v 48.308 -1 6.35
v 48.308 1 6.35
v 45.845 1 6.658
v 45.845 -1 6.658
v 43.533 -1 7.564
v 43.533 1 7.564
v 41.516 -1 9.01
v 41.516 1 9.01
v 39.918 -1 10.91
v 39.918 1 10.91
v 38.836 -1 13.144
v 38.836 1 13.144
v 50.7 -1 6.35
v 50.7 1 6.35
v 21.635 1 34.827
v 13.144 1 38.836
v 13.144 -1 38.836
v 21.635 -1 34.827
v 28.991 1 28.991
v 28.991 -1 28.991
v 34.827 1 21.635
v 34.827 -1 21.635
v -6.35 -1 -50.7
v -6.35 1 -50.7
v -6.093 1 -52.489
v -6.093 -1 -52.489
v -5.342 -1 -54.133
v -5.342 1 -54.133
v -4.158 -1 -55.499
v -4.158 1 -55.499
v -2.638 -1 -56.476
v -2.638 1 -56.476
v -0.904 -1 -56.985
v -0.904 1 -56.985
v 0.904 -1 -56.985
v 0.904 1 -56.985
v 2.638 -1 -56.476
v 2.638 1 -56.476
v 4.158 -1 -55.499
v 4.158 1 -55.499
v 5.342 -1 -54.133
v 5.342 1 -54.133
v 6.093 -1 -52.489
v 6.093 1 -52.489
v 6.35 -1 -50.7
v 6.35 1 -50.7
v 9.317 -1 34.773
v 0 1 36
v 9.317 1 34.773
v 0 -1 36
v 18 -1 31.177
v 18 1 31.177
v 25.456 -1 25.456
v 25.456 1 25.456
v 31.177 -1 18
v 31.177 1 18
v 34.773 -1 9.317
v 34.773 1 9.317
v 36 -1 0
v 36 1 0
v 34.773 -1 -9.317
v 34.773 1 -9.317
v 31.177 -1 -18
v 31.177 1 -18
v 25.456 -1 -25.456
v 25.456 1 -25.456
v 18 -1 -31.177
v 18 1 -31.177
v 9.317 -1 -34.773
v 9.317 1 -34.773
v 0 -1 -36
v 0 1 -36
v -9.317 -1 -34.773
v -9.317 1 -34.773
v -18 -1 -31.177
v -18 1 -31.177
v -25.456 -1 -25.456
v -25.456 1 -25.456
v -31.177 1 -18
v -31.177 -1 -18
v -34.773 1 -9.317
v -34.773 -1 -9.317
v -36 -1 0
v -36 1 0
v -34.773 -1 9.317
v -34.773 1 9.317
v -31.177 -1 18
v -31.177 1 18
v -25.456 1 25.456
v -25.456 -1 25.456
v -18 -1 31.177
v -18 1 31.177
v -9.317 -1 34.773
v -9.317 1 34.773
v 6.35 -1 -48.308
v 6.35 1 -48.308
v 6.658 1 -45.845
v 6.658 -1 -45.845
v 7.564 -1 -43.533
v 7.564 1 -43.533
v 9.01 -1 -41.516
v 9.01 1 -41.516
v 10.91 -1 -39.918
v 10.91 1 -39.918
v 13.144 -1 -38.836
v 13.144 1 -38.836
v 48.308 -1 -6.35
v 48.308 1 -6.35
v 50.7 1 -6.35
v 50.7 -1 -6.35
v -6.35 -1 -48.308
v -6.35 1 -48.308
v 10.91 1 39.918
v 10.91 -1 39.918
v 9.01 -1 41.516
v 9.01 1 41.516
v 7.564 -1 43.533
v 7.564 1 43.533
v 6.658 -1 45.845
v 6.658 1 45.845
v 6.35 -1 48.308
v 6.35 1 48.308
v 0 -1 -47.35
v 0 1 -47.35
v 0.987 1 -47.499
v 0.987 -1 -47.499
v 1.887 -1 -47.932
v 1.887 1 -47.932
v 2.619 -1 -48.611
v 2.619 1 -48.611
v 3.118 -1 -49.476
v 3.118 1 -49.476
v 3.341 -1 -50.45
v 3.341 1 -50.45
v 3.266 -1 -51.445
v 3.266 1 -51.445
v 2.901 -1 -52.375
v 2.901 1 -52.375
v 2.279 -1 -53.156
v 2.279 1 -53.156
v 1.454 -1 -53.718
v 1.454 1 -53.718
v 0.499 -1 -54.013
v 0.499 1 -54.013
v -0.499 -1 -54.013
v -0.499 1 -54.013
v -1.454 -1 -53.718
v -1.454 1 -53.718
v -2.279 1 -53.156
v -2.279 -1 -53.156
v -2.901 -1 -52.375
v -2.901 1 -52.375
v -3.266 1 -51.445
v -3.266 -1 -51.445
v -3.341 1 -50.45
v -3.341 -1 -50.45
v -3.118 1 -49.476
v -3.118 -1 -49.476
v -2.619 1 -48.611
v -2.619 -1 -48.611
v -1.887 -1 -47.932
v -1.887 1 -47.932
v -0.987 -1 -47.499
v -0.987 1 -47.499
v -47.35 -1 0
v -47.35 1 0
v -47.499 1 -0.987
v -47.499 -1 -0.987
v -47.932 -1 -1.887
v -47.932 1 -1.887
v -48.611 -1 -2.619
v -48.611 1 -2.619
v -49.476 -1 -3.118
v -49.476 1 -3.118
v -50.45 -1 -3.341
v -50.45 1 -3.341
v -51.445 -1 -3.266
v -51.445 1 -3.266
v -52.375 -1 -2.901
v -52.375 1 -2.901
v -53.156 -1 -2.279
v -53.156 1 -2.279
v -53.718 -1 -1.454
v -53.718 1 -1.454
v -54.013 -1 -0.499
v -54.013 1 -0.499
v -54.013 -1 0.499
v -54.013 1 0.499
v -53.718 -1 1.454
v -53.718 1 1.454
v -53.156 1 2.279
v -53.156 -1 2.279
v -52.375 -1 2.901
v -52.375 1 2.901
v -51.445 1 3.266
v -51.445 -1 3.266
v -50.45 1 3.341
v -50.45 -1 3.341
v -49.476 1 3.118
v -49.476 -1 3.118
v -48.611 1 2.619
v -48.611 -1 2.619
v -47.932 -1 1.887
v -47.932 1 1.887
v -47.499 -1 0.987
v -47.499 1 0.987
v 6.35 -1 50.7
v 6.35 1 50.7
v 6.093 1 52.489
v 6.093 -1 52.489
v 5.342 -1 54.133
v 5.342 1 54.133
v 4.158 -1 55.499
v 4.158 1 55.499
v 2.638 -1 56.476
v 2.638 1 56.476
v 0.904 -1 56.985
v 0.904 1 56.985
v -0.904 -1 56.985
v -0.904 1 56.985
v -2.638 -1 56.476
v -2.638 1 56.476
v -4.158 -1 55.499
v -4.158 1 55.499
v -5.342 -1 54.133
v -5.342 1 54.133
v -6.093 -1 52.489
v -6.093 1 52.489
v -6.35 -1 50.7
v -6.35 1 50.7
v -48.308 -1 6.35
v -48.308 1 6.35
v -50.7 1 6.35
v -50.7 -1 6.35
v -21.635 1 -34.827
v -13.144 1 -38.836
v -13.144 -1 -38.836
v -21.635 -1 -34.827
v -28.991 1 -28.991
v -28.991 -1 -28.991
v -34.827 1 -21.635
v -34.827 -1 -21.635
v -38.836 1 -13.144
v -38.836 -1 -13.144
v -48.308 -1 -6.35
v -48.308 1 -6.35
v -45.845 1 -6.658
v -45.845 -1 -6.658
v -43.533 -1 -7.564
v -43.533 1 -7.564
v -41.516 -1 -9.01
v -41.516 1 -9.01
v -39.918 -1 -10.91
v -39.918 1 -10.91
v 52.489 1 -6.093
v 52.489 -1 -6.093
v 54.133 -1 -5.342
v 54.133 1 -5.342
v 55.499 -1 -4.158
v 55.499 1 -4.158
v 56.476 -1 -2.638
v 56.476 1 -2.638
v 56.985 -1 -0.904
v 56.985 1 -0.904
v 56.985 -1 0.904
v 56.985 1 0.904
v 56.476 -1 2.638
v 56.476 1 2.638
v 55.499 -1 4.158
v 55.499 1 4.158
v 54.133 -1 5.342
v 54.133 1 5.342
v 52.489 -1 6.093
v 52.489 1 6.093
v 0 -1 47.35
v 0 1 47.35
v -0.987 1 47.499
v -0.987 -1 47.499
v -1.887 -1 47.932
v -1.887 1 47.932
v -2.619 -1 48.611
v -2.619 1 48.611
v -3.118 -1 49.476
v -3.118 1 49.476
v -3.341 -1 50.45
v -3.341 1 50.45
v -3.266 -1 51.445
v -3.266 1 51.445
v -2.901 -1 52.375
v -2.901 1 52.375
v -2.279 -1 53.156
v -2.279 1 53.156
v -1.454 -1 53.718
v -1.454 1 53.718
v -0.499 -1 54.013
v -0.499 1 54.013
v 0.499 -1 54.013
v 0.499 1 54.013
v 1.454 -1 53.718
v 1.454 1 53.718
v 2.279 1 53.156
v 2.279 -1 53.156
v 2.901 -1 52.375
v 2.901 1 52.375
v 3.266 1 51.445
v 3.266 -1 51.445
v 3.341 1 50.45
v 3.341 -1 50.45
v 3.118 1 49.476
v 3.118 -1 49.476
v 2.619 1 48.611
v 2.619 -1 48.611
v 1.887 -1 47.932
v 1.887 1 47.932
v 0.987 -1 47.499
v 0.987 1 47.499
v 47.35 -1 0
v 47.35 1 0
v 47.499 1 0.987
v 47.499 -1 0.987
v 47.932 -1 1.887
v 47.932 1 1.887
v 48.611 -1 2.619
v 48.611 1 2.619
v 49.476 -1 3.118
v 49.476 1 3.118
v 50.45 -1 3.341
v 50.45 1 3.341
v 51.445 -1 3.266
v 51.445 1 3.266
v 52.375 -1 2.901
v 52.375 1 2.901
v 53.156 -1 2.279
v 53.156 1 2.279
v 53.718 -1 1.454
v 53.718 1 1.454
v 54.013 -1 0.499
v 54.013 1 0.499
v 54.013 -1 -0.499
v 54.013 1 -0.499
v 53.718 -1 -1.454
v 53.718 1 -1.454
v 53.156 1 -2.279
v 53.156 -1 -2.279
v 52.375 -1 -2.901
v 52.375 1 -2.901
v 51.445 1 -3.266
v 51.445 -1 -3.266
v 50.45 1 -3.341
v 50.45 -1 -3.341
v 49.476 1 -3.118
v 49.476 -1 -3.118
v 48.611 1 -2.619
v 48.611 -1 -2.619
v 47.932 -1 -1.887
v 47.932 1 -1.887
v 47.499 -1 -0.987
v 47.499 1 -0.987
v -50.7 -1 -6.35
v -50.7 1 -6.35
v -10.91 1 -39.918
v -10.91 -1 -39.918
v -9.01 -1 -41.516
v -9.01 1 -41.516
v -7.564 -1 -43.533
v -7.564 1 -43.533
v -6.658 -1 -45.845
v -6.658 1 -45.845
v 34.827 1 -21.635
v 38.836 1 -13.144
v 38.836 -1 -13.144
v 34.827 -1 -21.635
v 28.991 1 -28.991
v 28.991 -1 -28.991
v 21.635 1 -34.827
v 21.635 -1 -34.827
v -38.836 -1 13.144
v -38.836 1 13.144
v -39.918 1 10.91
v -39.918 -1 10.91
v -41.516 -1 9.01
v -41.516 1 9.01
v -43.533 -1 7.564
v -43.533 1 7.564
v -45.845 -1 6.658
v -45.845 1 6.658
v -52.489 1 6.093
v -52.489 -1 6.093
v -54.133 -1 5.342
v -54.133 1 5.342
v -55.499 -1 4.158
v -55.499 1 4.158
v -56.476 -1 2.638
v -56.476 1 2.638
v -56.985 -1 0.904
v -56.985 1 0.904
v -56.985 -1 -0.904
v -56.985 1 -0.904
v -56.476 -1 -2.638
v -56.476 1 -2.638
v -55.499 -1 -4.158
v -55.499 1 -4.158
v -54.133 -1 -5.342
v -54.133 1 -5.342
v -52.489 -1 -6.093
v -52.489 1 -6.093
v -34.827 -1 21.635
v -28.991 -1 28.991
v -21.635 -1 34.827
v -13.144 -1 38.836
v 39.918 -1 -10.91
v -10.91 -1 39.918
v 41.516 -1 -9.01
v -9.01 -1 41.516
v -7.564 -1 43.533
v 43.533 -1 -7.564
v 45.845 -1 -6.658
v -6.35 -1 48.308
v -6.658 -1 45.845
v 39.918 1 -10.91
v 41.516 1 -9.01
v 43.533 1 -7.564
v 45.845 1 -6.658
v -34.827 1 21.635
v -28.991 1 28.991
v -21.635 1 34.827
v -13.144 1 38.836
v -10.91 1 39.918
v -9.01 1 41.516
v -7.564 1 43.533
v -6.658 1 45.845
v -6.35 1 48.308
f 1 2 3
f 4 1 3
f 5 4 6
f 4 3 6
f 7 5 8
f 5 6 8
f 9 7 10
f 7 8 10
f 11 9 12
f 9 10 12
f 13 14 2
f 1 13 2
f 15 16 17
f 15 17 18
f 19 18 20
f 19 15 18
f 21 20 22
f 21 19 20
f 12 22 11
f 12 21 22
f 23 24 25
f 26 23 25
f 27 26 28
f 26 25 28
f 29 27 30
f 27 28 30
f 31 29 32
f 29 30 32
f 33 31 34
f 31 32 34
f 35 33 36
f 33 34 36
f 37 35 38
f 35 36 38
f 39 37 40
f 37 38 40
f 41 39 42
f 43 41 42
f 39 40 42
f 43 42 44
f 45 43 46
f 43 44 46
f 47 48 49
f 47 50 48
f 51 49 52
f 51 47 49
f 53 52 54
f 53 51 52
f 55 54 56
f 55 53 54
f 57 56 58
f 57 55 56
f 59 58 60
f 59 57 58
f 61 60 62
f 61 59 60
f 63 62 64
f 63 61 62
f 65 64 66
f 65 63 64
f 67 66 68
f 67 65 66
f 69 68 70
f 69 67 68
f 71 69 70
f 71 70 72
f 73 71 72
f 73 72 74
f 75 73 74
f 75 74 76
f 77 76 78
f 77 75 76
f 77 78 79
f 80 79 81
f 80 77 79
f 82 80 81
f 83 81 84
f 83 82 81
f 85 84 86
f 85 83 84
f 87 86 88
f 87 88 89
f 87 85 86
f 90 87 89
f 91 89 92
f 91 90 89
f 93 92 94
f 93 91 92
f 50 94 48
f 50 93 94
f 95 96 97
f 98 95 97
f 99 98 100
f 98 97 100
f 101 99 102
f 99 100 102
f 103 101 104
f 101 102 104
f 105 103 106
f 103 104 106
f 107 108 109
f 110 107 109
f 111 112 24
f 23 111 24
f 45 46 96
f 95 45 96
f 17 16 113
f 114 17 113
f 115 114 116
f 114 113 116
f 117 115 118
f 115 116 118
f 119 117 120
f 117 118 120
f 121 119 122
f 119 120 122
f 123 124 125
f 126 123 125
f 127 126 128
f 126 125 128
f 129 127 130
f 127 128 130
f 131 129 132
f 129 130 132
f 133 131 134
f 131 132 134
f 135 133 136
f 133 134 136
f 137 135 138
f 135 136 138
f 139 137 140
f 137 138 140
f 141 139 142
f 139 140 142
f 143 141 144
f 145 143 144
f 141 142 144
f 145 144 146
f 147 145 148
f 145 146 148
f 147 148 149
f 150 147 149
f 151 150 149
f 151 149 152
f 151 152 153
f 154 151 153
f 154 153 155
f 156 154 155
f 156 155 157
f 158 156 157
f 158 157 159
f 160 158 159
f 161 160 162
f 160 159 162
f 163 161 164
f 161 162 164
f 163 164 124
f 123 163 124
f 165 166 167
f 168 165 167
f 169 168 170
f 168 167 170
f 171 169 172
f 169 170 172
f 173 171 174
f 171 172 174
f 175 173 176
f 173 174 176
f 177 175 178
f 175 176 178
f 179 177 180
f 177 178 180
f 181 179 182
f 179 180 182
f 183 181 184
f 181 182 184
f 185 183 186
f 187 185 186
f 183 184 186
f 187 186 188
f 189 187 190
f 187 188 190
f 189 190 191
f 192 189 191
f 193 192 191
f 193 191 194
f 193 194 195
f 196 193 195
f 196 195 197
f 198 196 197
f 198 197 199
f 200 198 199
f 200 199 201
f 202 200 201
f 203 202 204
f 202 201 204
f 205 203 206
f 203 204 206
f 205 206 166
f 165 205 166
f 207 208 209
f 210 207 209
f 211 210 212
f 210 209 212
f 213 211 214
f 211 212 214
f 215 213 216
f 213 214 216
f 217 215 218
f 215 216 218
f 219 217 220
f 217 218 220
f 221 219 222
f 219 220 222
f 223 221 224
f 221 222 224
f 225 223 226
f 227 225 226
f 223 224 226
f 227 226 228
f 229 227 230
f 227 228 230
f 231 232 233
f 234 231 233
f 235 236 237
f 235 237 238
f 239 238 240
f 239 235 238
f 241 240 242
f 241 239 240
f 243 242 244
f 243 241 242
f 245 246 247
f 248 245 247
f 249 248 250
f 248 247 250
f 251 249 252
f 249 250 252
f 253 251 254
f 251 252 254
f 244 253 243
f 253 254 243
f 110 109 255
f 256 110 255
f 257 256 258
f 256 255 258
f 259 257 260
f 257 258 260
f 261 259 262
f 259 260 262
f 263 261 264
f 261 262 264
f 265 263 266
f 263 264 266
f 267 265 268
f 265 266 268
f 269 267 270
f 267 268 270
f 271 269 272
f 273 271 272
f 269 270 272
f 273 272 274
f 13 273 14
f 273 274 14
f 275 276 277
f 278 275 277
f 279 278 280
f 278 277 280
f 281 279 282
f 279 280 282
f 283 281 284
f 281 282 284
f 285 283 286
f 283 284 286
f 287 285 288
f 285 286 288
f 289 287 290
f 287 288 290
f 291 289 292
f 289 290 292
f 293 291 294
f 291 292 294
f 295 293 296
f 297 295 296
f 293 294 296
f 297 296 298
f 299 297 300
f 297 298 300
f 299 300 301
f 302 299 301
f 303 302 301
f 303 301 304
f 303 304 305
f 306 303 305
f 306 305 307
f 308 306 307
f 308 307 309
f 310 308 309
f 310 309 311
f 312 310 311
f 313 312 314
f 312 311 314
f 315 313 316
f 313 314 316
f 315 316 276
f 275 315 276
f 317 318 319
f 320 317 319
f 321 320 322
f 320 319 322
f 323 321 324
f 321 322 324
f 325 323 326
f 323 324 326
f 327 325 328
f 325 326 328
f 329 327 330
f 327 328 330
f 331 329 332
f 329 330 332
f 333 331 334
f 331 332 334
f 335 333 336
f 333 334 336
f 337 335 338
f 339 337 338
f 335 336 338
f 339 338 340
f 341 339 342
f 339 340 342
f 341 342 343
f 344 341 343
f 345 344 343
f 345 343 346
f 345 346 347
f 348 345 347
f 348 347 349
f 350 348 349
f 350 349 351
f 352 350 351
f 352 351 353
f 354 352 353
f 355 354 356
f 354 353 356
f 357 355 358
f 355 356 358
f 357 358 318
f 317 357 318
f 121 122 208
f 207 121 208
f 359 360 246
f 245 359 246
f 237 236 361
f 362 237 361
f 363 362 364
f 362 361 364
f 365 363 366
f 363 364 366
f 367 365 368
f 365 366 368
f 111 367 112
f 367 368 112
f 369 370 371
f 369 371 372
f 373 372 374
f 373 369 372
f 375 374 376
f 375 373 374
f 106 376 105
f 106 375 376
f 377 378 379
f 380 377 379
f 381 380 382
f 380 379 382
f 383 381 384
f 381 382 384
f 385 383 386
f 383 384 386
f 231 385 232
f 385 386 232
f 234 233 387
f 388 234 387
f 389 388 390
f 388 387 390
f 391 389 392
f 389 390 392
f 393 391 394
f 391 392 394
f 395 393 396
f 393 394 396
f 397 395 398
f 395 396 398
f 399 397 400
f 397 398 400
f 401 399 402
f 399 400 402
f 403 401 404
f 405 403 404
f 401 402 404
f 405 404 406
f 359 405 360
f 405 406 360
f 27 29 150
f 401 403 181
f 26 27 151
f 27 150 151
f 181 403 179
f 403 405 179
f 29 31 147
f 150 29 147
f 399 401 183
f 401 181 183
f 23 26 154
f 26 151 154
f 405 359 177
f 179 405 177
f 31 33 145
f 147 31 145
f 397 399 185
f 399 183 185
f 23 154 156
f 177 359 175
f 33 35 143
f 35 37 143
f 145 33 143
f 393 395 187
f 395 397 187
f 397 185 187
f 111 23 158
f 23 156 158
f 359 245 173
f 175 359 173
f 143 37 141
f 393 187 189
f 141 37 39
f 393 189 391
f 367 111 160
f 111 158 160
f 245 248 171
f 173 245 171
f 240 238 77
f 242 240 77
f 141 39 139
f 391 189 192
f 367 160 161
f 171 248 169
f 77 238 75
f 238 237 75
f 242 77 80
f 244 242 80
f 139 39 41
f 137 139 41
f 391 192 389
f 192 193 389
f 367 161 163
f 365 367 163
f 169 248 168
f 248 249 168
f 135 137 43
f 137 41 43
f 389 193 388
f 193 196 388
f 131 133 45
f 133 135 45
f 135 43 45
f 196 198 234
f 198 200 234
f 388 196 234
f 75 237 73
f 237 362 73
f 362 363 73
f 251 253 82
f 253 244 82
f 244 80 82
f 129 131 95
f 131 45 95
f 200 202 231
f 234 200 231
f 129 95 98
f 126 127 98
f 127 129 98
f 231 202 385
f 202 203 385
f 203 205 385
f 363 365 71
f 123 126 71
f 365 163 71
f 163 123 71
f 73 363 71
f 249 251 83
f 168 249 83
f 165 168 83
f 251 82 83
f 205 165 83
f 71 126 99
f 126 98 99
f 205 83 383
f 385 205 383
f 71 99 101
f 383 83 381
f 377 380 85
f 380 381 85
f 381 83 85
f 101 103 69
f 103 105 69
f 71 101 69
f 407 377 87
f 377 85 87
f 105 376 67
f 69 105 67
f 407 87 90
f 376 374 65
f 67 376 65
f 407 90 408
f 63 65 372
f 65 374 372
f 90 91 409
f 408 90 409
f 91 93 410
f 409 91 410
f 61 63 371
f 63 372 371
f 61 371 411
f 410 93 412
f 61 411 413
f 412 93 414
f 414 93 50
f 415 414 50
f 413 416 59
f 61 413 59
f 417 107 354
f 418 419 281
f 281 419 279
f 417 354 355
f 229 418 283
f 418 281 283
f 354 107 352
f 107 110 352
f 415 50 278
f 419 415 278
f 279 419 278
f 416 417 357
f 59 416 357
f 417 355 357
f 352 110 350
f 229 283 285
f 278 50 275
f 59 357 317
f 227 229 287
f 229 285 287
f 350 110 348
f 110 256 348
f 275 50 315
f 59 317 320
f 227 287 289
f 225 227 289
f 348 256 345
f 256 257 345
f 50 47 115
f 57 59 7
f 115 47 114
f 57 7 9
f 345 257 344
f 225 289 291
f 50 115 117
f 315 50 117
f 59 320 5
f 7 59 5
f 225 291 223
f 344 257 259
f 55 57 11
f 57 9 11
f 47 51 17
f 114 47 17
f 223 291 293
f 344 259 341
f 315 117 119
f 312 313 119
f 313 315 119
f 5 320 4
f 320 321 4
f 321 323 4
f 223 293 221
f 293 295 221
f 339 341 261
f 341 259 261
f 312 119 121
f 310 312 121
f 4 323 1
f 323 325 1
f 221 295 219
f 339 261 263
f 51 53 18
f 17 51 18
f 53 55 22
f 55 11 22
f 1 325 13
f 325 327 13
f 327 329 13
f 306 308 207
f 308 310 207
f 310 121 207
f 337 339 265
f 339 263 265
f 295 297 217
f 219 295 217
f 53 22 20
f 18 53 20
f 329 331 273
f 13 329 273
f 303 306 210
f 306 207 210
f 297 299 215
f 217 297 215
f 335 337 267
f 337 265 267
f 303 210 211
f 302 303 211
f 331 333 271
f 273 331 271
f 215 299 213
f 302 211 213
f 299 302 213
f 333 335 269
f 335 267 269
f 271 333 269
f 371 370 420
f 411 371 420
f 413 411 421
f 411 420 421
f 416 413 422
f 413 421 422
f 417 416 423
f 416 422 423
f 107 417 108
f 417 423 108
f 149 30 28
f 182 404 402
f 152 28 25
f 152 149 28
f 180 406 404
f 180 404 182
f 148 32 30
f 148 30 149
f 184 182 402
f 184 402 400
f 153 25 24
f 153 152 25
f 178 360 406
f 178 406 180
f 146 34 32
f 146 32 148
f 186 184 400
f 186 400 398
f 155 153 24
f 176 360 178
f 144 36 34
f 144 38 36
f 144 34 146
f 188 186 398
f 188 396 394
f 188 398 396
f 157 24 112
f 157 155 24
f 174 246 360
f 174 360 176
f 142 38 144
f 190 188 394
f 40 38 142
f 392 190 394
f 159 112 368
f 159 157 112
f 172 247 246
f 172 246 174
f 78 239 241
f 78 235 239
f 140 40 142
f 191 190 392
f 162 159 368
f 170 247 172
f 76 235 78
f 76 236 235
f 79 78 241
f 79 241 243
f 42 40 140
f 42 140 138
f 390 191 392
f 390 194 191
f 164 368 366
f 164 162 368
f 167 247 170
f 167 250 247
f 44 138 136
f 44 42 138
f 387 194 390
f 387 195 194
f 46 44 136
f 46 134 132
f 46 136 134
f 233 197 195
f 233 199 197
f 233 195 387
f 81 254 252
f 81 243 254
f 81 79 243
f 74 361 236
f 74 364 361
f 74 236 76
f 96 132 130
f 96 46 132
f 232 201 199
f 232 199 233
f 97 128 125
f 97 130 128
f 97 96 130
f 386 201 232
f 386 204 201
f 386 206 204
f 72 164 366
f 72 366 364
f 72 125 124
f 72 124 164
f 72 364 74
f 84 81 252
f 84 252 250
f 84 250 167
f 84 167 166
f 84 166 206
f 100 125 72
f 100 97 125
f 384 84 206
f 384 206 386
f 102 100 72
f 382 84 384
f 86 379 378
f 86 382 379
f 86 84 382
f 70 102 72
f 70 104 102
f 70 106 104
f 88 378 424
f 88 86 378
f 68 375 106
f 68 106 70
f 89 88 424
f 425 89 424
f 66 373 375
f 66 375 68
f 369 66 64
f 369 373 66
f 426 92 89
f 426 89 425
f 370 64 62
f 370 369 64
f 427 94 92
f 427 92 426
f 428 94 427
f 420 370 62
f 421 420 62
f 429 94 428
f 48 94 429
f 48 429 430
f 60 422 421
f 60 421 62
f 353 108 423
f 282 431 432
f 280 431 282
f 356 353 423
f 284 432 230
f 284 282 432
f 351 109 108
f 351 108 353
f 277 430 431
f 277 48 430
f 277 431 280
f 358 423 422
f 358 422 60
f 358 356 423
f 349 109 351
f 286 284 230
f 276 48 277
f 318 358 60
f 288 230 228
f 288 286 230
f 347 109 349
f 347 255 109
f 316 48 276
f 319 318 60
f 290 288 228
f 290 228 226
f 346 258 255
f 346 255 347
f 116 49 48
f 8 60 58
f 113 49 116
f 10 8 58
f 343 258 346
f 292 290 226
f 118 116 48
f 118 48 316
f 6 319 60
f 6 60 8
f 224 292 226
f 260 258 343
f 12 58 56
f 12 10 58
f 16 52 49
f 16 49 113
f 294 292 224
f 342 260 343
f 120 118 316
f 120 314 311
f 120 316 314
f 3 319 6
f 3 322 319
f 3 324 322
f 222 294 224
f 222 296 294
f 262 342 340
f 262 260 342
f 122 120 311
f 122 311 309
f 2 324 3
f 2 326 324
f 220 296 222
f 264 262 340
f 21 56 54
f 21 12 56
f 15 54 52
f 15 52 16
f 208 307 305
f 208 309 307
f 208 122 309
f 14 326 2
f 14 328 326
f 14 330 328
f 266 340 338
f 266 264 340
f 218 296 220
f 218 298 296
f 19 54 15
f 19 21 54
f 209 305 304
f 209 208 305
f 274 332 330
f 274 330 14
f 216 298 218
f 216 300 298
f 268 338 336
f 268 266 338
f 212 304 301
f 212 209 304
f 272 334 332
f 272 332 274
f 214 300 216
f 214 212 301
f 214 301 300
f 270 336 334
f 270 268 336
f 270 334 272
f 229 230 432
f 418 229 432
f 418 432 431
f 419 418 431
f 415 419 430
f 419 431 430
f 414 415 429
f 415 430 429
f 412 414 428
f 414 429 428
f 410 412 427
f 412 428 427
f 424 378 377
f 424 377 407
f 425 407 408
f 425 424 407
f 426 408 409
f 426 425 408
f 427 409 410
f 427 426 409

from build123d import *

# Parameters (mm, degrees)
SKETCH1_R           = 41
SKETCH1_R_2         = 36
BOSS_EXTRUDE1_DEPTH = 1
SKETCH2_R           = 3.35
BOSS_EXTRUDE2_DEPTH = 2
CIRPATTERN1_COUNT   = 4


with BuildPart() as part:
    # Sketch1 → Boss-Extrude1 (new, symmetric)
    with BuildSketch(Plane(origin=(0, 0, 0), x_dir=(1, 0, 0), z_dir=(0, 1, 0))):
        with Locations(Location((0, 0, 0), (0, 0, 270))):
            Circle(SKETCH1_R)
        with Locations(Location((0, 0, 0), (0, 0, 270))):
            Circle(SKETCH1_R_2, mode=Mode.SUBTRACT)
    extrude(amount=BOSS_EXTRUDE1_DEPTH, both=True)

    # Sketch2 → Boss-Extrude2 (add)
    with BuildSketch(Plane(origin=(0, 1, 0), x_dir=(1, 0, 0), z_dir=(0, 1, 0))):
        with BuildLine():
            Line((-6.35, 48.308151486), (-6.35, 50.7))
            ThreePointArc((-6.35, 50.7), (0, 57.05), (6.35, 50.7))
            Line((6.35, 50.7), (6.35, 48.308151486))
            ThreePointArc((6.35, 48.308151486), (8.224151628, 42.479722175), (13.144117647, 38.83596492))
            ThreePointArc((13.144117647, 38.83596492), (0, 41), (-13.144117647, 38.83596492))
            ThreePointArc((-13.144117647, 38.83596492), (-8.224151628, 42.479722175), (-6.35, 48.308151486))
        make_face()
        with Locations(Location((0, 50.7, 0), (0, 0, 270))):
            Circle(SKETCH2_R, mode=Mode.SUBTRACT)
    boss_extrude2 = extrude(amount=-BOSS_EXTRUDE2_DEPTH)

    # CirPattern1: Boss-Extrude2 ×4 about axis
    cirpattern1_axis = Axis((0, 0, 0), (0, 1, 0))
    for i in range(1, CIRPATTERN1_COUNT):
        add(boss_extrude2.rotate(cirpattern1_axis, i * 360 / CIRPATTERN1_COUNT))


solid = part.part
